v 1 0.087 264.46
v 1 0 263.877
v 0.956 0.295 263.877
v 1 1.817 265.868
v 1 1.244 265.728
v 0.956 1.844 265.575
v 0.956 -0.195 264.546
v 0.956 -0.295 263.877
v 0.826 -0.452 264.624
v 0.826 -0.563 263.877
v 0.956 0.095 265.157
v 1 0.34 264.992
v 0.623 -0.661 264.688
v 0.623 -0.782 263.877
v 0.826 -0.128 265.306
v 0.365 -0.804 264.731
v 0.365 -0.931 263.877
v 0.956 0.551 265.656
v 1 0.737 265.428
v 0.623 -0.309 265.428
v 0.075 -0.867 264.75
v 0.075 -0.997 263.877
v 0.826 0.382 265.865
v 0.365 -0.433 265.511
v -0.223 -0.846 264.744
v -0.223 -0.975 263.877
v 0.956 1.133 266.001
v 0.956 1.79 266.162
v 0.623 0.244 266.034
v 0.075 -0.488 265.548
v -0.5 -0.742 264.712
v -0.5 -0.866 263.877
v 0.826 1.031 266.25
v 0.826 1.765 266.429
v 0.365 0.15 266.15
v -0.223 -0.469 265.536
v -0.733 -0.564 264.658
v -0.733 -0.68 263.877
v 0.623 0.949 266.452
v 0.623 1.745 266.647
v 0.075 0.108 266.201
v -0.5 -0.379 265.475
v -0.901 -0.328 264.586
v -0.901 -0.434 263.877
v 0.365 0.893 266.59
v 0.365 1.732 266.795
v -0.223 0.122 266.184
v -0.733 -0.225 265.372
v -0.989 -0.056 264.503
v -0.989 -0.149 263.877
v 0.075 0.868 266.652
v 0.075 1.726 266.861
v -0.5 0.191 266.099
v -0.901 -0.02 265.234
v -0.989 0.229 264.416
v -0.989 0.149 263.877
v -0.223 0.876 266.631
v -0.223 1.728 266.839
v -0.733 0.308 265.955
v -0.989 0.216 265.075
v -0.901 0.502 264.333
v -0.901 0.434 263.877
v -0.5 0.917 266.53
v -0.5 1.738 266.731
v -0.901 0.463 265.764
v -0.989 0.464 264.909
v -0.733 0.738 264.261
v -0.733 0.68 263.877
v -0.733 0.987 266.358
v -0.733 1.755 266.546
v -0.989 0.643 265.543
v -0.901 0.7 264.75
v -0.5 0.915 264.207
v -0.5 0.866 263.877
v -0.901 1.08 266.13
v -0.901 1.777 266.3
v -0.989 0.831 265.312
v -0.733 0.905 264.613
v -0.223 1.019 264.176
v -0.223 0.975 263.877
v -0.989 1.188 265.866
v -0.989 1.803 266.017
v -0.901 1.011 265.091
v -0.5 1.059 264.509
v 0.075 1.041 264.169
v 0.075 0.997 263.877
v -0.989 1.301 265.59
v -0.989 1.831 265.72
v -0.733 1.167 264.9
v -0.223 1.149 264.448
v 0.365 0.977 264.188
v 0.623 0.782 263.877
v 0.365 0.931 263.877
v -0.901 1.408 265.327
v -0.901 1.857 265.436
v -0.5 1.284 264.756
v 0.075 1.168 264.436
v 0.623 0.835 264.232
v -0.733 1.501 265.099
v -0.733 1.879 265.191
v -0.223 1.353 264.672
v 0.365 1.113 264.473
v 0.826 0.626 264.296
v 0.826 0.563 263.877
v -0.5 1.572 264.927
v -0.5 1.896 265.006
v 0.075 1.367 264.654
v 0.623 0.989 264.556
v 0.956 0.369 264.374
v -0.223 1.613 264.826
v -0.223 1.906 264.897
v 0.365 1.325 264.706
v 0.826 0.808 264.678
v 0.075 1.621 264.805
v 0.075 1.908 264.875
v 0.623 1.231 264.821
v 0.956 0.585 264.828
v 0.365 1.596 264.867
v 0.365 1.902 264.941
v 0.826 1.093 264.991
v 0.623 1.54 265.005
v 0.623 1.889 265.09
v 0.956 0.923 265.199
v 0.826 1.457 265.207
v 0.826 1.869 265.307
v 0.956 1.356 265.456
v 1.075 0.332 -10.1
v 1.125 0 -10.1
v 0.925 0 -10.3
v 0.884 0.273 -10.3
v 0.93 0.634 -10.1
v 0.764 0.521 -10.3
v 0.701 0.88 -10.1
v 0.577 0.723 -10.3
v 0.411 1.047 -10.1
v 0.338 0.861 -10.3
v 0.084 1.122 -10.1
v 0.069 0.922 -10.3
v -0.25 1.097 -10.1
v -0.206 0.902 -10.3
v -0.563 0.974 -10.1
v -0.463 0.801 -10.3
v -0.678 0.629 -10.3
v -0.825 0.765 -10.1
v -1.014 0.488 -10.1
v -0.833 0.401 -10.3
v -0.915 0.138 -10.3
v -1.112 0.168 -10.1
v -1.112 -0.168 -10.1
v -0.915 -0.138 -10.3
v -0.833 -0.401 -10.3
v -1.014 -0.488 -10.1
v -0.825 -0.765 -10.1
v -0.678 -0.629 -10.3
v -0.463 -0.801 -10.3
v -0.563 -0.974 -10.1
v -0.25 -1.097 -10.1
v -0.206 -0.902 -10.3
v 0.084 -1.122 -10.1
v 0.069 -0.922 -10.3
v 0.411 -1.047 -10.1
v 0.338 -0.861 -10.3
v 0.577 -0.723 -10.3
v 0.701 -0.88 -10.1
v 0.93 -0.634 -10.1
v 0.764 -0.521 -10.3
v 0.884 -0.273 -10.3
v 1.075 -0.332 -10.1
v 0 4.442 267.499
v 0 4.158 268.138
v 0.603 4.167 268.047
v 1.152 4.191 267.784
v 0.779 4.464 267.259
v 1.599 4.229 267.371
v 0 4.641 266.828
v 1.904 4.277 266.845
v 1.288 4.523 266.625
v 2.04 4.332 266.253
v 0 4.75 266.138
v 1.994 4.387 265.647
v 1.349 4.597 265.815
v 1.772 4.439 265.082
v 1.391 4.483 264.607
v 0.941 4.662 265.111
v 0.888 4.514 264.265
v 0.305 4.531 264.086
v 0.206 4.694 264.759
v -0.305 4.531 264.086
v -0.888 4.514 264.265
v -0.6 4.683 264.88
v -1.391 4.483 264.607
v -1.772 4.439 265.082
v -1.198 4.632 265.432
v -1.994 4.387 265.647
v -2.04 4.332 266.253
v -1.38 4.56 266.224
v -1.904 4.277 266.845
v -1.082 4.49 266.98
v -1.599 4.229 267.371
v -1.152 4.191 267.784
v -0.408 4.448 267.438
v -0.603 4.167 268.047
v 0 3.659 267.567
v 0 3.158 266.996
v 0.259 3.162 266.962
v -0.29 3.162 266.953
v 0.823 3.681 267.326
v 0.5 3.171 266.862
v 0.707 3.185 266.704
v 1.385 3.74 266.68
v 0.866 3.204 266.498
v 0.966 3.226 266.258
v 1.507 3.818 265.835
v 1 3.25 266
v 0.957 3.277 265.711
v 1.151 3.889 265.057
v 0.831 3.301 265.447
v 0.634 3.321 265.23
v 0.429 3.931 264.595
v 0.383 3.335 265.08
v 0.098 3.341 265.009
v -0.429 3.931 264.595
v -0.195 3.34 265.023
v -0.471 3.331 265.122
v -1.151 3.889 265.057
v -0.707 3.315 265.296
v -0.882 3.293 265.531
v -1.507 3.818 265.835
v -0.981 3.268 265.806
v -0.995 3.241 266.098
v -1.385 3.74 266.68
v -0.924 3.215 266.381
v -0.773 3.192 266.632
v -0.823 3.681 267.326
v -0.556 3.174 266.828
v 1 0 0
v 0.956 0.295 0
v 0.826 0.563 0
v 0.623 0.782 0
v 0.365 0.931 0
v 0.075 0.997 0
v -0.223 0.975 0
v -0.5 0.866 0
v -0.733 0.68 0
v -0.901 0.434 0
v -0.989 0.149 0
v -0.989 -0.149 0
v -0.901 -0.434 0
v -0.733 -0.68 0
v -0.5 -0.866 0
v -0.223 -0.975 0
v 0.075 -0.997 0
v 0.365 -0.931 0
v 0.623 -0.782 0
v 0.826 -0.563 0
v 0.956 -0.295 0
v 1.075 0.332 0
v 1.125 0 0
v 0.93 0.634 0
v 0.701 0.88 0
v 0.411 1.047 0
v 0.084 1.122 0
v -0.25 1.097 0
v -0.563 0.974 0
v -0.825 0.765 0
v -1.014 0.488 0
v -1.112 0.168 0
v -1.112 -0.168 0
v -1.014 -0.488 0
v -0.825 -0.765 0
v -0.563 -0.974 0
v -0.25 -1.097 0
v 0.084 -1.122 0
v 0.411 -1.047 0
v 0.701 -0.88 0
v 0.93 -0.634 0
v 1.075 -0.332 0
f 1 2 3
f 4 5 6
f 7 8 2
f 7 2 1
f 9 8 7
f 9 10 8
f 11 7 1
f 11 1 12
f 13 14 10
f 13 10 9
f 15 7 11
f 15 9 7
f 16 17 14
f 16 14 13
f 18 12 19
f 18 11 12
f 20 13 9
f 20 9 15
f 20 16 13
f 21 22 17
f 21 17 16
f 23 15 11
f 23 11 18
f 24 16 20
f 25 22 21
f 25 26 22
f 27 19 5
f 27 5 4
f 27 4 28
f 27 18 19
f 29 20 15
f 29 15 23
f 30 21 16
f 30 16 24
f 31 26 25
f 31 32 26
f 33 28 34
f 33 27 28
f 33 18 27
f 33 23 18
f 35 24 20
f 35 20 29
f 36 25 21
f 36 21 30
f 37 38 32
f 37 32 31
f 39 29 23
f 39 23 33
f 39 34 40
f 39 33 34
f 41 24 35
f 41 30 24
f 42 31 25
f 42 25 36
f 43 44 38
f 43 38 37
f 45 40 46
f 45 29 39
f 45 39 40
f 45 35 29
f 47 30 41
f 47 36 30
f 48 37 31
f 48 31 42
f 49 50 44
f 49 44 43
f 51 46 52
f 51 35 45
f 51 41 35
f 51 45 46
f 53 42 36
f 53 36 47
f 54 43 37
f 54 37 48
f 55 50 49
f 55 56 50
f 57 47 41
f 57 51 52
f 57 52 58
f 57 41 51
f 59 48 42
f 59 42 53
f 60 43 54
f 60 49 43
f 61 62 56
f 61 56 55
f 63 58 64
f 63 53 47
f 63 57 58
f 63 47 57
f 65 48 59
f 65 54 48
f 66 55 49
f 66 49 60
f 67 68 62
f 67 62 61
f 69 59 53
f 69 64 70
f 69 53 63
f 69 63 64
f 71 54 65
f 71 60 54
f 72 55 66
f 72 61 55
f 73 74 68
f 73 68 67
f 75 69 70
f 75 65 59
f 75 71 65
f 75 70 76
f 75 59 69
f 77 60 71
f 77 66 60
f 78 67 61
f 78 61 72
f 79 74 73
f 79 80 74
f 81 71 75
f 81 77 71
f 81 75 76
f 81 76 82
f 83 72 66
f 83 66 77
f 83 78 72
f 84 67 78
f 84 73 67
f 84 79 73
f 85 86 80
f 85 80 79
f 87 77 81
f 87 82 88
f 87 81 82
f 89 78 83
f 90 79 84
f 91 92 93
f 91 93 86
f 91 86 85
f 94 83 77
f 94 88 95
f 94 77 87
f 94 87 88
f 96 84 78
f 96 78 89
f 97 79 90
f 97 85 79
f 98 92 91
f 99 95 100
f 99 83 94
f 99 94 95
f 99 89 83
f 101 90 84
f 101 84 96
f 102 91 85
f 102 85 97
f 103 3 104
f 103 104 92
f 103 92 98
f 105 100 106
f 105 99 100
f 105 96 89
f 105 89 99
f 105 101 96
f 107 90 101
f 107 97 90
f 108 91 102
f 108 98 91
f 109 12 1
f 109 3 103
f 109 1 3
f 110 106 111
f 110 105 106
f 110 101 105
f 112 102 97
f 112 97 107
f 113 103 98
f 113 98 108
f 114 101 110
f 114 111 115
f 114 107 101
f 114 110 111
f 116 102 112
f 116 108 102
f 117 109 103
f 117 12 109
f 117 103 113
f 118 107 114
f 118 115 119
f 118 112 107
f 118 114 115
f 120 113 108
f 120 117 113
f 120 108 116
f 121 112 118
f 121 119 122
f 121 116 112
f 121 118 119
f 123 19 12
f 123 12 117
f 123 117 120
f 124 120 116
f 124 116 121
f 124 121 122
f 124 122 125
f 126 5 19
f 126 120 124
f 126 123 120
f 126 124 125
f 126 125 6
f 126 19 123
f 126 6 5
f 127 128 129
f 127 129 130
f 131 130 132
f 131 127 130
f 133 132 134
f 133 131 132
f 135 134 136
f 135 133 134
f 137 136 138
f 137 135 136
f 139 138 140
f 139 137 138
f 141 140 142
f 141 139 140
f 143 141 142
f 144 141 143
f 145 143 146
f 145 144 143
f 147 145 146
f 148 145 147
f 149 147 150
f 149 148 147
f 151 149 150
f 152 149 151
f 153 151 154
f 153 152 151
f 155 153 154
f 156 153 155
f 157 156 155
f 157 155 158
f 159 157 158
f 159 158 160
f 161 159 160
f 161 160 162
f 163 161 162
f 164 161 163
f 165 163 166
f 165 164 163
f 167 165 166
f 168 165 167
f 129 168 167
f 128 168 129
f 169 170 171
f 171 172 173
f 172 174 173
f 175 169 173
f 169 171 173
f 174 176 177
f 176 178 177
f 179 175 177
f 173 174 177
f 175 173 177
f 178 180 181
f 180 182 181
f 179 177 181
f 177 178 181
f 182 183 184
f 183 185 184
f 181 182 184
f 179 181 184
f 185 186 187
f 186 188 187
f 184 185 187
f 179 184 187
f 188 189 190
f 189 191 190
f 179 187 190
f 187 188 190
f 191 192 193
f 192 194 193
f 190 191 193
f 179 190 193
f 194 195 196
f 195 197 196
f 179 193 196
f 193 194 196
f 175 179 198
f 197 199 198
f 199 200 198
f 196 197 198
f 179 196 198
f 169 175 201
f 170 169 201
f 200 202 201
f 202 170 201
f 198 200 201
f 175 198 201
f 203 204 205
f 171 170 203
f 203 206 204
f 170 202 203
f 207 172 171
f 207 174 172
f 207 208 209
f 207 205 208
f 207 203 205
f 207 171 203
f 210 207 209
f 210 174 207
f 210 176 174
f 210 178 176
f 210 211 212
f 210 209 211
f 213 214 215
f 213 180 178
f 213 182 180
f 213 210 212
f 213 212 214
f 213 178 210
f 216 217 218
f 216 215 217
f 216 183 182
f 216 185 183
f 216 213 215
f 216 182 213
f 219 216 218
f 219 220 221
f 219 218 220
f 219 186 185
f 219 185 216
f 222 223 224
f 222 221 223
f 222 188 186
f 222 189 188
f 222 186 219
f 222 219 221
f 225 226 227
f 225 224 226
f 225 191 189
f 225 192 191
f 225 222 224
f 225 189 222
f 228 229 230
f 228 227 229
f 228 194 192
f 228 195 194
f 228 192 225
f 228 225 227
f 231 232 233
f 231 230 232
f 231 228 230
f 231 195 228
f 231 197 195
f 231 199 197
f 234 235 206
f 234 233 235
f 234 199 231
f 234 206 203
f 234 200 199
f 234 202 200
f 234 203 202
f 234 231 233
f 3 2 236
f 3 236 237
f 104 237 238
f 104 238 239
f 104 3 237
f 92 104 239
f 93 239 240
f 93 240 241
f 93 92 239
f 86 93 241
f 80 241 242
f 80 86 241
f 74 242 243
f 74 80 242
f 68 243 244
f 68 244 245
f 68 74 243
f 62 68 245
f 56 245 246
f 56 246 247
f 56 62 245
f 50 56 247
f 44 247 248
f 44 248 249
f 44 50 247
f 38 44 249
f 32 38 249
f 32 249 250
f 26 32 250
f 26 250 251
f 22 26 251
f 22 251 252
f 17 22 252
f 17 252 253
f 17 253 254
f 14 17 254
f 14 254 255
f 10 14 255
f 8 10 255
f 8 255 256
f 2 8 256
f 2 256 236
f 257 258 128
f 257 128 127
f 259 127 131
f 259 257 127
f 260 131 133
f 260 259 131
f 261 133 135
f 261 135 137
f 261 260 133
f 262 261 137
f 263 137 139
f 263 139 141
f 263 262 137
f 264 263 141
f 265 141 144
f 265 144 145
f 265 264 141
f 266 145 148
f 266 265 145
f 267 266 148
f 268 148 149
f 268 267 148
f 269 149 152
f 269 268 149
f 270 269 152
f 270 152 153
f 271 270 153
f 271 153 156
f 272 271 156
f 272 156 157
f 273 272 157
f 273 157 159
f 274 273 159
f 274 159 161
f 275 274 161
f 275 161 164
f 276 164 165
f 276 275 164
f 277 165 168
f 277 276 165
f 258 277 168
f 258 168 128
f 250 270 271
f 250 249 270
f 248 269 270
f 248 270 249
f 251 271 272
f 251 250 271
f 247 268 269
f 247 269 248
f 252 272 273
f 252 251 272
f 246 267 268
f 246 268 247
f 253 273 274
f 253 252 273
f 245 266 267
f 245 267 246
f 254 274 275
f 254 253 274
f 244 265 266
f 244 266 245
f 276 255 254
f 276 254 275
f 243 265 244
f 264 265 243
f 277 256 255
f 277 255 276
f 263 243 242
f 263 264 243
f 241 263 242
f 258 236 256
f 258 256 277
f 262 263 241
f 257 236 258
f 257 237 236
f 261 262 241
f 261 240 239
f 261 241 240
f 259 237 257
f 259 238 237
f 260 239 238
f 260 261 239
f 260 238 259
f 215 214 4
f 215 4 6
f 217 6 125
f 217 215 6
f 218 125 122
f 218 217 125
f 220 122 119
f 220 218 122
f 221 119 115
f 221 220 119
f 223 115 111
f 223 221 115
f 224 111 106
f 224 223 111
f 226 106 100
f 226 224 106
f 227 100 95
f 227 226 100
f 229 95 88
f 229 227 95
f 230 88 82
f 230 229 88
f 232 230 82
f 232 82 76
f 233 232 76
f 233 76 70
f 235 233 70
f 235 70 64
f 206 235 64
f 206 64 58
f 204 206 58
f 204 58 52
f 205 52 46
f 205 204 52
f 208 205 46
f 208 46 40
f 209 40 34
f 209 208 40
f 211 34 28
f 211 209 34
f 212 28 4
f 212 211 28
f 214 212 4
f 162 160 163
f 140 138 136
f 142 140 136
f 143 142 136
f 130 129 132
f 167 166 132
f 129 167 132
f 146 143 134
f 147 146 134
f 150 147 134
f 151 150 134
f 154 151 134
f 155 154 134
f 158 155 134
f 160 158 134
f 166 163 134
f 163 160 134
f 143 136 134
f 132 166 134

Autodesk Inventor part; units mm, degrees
ref_plane "YZ Plane" through (0, 0, 0) normal (1, 0, 0) x (0, 1, 0)
ref_plane "XZ Plane" through (0, 0, 0) normal (0, 1, 0) x (-1, 0, 0)
ref_plane "XY Plane" through (0, 0, 0) normal (0, 0, 1) x (1, 0, 0)
sketch "Szkic1" plane through (0, 0, 0) normal (0, 0, 1) x (1, 0, 0)
  circle A0 centre (0, 0) radius 1
  dimension "d0" = 2
sketch "Szkic4" plane through (0, 0, 0) normal (1, 0, 0) x (0, 1, 0)
  line L0 (0, 0) -> (0, 263.8767)
  arc A0 (1.817, 265.8683) -> (0, 263.8767) centre (2, 263.8767) ccw
  line L1 (1.817, 265.8683) -> (3.25, 266)
  dimension "d2" = 266
  dimension "d3" = 2
  dimension "d4" = 3.25
  dimension "d5" = 95.25
sweep "Szprycha" add profiles "Szkic1" path "Szkic4"
sketch "Szkic5" plane through (0, 0, 0) normal (1, 0, 0) x (0, 1, 0)
  line L0 (3.3415, 265.0042) -> (3.1585, 266.9958) construction
  line L1 (3.1585, 266.9958) -> (3.25, 266)
  line L2 (3.1585, 266.9958) -> (4.1585, 268.1378)
  arc A0 (4.75, 266.1378) -> (4.1585, 268.1378) centre (-0.5843, 265.6477) ccw
  line L3 (1.7255, 266.8641) -> (3.1585, 266.9958) construction
  line L4 (1.9085, 264.8725) -> (3.3415, 265.0042) construction
  line L5 (1.9085, 264.8725) -> (1.7255, 266.8641) construction
  line L6 (1.817, 265.8683) -> (3.25, 266) construction
  line L7 (3.25, 266) -> (4.75, 266.1378)
  point P0 (0, 0)
  dimension "d7" = 1
  dimension "d8" = 1.5
  dimension "d10" = 2
revolve "Główka" add sketch "Szkic5" angle 360 about axis through (0, 3.25, 266) along (0, 0.9958049, 0.0915016)
sketch "Szkic6" plane through (0, 0, 0) normal (0, 0, 1) x (1, 0, 0)
  circle A0 centre (0, 0) radius 1.125
  dimension "d13" = 2.25
extrude "Połączenie z nyplem" add sketch "Szkic6" against normal blind 10.3
chamfer "Faza1" distance 0.2 angle 45 1 edges at (-1.125, 0, -10.3)
thread "Gwint2"
properties part number "Szprycha" material "Aluminium AW-7020"
